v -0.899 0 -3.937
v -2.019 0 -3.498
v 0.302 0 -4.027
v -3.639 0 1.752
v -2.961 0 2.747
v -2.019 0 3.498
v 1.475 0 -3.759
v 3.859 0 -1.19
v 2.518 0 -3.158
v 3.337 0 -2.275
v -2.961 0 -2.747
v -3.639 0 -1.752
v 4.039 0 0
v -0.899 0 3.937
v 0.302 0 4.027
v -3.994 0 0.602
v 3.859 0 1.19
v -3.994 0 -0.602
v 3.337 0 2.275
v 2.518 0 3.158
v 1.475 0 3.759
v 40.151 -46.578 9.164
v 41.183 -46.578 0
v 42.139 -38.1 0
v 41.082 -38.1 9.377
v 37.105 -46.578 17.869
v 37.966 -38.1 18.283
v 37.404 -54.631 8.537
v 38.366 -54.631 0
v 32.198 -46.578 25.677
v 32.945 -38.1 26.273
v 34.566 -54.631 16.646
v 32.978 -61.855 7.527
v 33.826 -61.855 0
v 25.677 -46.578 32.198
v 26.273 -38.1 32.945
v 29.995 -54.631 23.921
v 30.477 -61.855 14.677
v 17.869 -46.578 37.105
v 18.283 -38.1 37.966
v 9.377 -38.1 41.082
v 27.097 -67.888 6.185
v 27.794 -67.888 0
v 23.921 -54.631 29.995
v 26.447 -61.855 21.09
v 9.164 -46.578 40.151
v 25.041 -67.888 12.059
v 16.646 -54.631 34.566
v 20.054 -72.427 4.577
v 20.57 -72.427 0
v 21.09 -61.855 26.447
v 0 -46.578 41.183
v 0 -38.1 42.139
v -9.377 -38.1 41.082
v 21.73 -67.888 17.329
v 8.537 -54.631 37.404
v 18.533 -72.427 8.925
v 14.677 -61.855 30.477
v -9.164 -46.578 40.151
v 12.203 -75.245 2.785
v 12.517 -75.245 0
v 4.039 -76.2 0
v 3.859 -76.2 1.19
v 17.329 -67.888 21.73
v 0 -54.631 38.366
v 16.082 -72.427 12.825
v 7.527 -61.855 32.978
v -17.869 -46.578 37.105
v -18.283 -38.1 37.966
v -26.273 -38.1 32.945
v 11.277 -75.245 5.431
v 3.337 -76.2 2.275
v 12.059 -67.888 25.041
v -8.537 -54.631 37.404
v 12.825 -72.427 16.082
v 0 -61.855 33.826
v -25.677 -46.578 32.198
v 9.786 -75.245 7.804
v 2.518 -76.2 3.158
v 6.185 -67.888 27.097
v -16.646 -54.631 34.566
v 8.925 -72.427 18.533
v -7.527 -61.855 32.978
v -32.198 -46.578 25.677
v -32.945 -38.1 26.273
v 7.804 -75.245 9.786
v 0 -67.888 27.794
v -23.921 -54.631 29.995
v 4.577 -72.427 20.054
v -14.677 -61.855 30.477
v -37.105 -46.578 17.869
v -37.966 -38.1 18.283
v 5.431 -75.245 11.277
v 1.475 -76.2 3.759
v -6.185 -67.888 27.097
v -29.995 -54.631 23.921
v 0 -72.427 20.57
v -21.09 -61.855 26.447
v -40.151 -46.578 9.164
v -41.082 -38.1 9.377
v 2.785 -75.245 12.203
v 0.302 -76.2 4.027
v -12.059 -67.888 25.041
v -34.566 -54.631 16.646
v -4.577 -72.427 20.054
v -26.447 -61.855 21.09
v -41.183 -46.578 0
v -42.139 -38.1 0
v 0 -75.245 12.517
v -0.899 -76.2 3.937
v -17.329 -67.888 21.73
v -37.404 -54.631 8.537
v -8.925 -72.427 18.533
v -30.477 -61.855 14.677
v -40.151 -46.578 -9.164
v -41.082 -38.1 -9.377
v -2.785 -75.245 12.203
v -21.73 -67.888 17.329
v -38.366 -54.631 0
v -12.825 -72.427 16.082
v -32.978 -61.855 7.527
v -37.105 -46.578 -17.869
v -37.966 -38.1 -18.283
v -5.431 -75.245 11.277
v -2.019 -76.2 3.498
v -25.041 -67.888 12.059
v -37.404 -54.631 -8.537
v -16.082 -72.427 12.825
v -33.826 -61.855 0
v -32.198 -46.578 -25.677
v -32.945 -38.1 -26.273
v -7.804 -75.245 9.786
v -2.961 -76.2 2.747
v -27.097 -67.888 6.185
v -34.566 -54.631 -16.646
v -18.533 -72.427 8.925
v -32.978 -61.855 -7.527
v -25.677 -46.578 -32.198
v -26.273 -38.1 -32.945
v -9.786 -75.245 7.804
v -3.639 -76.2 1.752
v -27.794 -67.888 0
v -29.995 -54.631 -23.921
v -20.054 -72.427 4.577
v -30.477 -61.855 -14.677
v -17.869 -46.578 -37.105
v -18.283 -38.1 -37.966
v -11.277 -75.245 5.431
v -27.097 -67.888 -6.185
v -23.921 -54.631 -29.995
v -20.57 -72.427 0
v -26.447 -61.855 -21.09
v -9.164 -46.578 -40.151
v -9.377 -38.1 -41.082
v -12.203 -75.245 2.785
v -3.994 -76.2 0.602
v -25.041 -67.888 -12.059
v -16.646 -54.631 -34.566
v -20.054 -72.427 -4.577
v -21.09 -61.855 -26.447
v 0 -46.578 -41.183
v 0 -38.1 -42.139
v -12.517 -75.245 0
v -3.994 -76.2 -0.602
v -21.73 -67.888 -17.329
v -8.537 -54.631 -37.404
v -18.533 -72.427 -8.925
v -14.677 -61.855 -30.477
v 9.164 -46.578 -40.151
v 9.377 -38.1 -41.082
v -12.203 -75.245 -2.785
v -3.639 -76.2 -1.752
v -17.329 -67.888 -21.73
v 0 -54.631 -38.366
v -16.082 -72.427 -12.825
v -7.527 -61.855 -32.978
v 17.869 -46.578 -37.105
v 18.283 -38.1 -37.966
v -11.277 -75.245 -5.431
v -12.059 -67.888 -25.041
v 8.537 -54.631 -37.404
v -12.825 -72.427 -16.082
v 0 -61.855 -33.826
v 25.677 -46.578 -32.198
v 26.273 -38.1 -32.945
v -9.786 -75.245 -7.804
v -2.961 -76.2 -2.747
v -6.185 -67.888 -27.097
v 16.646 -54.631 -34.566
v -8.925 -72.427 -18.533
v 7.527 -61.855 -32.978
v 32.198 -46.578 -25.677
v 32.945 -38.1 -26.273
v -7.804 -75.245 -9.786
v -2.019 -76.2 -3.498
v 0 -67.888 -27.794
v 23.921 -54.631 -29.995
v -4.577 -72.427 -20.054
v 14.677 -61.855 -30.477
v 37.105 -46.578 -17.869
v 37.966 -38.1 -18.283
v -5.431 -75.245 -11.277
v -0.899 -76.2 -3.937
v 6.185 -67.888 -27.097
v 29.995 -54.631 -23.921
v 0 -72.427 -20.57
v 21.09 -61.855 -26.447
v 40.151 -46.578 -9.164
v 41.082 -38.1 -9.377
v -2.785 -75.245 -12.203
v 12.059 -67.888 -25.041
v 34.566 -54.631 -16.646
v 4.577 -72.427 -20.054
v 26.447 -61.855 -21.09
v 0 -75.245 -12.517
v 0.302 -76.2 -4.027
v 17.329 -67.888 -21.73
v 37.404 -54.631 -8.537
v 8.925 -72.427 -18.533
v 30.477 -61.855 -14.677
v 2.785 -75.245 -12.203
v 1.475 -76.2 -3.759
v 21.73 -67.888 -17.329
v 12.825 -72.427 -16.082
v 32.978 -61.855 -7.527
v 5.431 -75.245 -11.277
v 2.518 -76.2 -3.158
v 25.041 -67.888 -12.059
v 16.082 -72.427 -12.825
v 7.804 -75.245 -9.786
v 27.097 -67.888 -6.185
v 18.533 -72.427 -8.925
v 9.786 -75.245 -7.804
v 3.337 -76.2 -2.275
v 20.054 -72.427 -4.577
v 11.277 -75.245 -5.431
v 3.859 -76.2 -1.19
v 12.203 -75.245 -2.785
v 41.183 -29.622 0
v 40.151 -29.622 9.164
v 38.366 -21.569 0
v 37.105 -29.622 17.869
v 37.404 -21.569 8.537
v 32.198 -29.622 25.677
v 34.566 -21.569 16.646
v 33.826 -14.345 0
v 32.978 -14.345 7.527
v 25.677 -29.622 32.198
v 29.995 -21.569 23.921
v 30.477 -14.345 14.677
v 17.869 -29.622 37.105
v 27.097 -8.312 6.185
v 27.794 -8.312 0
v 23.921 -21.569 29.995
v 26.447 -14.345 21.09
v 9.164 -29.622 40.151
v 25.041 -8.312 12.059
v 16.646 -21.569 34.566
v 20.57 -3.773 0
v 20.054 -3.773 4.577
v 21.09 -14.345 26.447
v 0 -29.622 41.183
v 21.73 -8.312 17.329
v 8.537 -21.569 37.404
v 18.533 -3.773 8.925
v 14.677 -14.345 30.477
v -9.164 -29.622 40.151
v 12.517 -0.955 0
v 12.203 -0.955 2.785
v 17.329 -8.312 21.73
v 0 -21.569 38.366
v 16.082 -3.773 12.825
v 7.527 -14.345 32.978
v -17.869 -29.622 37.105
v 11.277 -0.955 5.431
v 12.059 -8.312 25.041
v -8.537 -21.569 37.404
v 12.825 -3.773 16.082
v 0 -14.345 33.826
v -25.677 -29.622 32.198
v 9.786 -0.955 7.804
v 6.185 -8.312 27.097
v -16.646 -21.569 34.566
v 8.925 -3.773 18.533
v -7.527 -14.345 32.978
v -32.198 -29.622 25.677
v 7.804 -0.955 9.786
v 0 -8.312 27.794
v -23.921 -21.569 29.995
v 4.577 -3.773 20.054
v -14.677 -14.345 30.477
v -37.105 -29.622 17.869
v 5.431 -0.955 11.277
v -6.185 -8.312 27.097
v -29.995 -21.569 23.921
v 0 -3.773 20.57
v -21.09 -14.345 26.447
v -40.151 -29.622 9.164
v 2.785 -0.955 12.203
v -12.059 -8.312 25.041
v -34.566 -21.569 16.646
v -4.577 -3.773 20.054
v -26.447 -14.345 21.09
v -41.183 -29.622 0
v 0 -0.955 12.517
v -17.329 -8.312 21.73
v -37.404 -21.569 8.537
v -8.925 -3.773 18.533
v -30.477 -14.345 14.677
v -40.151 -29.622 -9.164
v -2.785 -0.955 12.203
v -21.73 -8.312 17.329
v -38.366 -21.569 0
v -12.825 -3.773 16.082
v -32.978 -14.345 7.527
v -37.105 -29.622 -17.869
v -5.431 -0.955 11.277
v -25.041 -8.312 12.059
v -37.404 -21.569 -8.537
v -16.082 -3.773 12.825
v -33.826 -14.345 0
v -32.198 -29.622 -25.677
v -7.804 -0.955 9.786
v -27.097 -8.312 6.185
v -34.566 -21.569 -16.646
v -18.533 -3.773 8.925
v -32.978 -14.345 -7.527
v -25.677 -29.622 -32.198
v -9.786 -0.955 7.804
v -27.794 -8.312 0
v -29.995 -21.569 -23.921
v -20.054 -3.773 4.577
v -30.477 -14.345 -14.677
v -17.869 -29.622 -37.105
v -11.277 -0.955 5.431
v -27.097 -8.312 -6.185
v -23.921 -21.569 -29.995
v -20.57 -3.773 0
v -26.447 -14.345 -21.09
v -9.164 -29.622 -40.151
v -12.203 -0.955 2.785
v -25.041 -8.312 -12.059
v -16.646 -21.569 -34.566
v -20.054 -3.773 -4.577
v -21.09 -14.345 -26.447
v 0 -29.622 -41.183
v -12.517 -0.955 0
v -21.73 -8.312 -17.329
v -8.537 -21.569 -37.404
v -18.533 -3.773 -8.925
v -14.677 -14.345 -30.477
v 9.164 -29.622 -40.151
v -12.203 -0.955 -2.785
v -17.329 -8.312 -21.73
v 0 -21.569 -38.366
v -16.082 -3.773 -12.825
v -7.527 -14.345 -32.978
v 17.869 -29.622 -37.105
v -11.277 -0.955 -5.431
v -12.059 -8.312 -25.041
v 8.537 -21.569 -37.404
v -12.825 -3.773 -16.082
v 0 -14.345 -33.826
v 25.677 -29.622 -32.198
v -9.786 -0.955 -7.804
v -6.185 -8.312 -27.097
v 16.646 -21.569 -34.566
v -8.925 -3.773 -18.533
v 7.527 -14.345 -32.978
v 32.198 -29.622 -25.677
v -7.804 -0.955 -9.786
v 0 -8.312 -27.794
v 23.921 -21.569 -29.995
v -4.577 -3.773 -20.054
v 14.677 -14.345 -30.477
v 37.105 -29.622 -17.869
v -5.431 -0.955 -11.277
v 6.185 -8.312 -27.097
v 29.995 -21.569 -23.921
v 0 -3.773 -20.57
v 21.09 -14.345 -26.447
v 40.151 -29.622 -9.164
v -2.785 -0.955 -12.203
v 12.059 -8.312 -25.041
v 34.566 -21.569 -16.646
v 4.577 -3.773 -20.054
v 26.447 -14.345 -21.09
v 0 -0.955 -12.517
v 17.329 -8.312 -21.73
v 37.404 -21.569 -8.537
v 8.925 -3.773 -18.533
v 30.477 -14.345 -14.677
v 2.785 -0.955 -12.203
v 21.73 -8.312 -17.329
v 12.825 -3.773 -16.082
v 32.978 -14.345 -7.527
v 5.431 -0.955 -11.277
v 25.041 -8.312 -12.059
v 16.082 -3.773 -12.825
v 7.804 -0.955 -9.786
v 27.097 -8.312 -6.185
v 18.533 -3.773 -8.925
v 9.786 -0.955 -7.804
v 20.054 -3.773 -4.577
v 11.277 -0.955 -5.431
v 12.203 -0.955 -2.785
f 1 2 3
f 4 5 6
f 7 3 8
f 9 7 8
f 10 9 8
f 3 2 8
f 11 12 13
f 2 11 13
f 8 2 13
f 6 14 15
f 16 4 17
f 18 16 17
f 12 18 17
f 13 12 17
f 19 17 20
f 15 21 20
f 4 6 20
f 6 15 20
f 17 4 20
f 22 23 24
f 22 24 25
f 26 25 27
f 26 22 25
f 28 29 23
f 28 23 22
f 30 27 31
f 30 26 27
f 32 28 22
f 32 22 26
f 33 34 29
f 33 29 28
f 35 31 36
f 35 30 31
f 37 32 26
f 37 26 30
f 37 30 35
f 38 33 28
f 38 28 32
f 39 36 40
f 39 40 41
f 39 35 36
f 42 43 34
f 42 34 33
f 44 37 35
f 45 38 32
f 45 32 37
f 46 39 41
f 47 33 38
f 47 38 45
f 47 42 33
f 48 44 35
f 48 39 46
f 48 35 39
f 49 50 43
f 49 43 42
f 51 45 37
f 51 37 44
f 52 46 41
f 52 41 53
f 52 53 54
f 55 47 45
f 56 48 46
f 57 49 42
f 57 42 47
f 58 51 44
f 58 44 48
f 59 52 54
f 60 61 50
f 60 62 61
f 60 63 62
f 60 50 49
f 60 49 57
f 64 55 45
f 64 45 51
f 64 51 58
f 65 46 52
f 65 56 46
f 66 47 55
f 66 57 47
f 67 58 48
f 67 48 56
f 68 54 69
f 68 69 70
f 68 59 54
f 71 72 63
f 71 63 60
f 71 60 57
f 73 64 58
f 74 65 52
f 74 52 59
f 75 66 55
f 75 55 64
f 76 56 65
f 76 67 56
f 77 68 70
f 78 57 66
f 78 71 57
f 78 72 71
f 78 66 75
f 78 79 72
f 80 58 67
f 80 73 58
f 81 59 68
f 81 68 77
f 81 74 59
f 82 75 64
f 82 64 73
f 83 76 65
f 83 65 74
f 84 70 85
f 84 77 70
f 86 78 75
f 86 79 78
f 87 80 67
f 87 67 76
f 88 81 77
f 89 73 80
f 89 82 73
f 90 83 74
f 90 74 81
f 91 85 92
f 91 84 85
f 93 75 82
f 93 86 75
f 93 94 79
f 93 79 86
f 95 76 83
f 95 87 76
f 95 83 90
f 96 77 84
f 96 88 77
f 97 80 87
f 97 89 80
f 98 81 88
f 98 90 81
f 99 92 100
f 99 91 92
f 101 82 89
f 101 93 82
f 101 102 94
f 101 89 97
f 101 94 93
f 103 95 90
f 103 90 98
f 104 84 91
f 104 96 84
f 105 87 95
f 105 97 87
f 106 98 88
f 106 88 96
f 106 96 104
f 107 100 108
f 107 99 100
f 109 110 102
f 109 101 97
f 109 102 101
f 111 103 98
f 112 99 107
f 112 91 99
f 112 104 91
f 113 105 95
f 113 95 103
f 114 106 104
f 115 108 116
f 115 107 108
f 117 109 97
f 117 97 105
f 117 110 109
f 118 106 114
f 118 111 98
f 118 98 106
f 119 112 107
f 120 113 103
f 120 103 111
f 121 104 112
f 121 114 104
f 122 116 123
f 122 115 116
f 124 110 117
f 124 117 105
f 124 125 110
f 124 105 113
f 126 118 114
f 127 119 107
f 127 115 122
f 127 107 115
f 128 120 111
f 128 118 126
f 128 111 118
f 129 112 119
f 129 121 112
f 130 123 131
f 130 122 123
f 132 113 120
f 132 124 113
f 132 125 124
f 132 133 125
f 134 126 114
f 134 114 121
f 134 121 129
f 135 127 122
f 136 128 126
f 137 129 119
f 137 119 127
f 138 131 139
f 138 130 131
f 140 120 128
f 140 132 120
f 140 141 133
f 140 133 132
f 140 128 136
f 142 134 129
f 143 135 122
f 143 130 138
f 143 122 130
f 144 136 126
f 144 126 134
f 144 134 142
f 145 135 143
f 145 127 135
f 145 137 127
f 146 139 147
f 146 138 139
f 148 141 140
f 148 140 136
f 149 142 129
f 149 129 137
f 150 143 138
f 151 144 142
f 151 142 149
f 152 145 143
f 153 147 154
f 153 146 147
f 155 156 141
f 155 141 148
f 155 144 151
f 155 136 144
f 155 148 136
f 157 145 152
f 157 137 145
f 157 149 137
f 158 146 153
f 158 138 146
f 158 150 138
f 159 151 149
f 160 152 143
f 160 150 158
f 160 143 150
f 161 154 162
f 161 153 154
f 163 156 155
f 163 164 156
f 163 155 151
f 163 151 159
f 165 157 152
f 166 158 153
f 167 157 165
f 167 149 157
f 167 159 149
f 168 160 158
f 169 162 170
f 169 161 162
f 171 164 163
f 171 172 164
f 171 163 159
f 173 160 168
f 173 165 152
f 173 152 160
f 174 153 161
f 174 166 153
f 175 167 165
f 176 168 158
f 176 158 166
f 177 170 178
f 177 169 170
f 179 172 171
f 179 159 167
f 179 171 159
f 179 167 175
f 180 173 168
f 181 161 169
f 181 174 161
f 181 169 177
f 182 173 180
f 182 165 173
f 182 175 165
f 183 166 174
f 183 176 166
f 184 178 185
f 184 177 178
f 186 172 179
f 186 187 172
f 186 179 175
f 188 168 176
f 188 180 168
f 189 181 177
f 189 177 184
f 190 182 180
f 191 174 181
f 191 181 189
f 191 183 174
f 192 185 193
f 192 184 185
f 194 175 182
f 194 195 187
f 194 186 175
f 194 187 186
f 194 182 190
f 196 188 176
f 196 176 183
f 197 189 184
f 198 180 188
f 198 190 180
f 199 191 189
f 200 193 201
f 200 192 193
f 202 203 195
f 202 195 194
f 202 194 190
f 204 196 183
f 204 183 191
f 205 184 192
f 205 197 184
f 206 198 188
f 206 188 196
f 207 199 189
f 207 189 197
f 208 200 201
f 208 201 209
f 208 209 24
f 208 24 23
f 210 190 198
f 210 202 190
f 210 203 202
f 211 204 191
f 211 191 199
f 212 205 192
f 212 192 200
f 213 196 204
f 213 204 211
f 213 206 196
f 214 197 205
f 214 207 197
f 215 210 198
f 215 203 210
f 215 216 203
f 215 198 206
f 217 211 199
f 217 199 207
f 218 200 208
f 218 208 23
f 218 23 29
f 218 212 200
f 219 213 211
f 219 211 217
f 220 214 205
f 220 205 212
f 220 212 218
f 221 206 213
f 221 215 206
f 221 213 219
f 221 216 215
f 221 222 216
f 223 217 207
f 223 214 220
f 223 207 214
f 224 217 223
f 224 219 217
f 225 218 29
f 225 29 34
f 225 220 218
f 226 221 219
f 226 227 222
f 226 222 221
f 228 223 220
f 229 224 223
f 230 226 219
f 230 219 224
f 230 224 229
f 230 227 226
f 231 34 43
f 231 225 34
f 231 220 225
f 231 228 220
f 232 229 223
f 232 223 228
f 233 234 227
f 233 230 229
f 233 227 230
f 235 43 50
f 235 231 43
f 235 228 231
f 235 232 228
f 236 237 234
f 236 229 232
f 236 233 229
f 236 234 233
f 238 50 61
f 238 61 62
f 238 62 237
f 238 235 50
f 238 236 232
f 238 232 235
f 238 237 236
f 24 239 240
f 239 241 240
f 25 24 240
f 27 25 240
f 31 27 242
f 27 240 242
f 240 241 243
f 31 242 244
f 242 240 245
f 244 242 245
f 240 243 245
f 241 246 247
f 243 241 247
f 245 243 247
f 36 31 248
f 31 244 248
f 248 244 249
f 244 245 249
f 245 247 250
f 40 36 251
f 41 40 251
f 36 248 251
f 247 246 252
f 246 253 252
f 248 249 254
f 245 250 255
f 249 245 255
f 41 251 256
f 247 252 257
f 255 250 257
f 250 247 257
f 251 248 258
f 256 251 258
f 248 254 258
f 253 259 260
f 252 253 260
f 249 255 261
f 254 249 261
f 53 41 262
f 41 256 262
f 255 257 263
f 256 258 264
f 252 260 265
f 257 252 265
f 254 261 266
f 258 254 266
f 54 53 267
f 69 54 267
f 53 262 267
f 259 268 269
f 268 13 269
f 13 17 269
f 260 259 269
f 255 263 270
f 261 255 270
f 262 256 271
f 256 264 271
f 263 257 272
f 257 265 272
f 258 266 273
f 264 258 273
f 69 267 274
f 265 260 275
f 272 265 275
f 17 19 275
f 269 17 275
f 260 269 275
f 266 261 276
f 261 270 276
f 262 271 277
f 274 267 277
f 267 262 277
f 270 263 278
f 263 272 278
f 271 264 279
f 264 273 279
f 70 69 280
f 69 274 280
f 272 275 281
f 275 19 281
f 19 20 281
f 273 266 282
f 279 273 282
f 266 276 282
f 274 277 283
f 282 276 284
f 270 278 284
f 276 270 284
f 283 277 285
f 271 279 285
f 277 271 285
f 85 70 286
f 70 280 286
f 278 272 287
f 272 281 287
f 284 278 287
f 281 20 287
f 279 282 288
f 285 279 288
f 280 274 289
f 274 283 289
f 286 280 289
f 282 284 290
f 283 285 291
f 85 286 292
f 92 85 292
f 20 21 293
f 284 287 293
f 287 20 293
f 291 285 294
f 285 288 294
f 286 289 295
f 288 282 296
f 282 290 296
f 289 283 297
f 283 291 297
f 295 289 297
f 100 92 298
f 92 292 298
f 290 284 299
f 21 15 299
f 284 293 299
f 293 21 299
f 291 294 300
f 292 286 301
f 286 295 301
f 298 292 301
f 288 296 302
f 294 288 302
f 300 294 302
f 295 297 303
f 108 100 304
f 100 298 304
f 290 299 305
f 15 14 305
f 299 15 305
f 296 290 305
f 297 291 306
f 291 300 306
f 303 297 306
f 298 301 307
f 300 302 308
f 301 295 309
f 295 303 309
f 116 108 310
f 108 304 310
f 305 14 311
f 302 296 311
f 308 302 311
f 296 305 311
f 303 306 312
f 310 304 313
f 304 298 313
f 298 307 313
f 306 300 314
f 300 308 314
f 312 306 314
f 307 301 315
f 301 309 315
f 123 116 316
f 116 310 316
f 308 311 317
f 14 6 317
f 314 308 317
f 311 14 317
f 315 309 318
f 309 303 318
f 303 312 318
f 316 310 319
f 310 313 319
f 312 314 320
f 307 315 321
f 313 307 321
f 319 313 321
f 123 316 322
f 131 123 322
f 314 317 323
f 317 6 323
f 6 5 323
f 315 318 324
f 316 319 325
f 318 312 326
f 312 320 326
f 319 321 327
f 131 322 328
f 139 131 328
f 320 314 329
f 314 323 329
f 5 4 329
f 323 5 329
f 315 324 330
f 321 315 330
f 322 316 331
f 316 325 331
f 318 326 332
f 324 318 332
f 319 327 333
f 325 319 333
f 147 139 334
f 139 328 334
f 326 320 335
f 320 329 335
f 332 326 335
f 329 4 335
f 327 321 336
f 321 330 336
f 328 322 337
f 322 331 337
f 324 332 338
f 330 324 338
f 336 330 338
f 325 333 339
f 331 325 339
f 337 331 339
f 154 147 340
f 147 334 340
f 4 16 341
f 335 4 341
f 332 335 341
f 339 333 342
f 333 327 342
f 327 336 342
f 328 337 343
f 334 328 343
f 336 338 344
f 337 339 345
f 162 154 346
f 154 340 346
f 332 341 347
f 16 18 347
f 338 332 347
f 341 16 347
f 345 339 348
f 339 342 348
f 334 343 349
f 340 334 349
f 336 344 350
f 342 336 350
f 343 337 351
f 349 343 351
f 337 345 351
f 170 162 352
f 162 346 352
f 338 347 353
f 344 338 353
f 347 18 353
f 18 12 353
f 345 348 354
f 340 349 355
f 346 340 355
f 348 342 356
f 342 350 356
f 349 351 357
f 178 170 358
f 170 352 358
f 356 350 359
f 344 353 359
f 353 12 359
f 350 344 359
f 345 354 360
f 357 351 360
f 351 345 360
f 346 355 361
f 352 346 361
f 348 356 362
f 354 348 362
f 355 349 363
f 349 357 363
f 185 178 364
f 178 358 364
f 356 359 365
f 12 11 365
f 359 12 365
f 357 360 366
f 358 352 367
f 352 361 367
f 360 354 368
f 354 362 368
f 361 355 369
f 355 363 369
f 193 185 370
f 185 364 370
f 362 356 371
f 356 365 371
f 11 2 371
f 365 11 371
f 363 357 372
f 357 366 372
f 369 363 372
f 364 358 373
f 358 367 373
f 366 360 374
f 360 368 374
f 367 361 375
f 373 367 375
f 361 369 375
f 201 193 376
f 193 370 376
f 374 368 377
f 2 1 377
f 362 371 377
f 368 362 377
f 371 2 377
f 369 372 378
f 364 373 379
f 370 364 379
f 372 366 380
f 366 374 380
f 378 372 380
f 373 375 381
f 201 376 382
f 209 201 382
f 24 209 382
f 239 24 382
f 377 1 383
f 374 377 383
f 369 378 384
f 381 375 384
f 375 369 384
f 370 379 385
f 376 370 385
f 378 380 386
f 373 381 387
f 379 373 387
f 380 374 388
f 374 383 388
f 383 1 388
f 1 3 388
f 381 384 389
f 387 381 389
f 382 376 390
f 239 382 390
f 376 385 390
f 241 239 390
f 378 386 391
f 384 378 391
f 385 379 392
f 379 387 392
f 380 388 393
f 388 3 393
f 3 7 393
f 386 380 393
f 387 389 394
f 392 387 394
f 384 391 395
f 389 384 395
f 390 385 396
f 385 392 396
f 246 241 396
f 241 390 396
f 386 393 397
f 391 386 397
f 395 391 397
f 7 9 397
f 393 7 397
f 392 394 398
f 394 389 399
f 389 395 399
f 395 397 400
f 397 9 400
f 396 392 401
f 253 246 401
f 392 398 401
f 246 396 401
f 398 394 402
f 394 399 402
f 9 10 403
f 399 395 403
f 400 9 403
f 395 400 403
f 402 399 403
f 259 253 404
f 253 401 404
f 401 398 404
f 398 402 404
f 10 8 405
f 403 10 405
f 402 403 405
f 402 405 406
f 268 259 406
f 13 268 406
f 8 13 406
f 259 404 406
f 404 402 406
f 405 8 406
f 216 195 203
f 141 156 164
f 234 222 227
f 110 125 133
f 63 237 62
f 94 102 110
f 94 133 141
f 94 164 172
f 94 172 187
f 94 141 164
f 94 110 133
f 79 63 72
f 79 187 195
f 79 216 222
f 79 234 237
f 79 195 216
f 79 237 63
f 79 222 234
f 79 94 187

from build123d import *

# Parameters (mm, degrees)
F0_R     = 42.1386103745
F1_DEPTH = 76.2
F2_R     = 38.1
F3_R     = 38.09999


# Not quite as in the source:
# - a fillet or chamfer is up to 0.001 mm smaller than in the source, because OpenCascade refuses the exact size


with BuildPart() as f1:
    # F0 (on Front) → F1 (new body)
    with BuildSketch(Plane.XZ):
        Circle(F0_R)
    extrude(amount=F1_DEPTH)

    # F2
    f2_edges = [f1.edges().sort_by_distance(p)[0] for p in [
        (-42.13861, -76.2, 0),
    ]]
    fillet(f2_edges, radius=F2_R)

    # F3 (radius 38.1 in the source; OpenCascade refuses exactly that, so slightly less here)
    f3_edges = [f1.edges().sort_by_distance(p)[0] for p in [
        (42.13861, -19.05, 0),
        (-42.13861, -38.1, 0),
        (-42.13861, 0, 0),
    ]]
    fillet(f3_edges, radius=F3_R)


solid = f1.part
